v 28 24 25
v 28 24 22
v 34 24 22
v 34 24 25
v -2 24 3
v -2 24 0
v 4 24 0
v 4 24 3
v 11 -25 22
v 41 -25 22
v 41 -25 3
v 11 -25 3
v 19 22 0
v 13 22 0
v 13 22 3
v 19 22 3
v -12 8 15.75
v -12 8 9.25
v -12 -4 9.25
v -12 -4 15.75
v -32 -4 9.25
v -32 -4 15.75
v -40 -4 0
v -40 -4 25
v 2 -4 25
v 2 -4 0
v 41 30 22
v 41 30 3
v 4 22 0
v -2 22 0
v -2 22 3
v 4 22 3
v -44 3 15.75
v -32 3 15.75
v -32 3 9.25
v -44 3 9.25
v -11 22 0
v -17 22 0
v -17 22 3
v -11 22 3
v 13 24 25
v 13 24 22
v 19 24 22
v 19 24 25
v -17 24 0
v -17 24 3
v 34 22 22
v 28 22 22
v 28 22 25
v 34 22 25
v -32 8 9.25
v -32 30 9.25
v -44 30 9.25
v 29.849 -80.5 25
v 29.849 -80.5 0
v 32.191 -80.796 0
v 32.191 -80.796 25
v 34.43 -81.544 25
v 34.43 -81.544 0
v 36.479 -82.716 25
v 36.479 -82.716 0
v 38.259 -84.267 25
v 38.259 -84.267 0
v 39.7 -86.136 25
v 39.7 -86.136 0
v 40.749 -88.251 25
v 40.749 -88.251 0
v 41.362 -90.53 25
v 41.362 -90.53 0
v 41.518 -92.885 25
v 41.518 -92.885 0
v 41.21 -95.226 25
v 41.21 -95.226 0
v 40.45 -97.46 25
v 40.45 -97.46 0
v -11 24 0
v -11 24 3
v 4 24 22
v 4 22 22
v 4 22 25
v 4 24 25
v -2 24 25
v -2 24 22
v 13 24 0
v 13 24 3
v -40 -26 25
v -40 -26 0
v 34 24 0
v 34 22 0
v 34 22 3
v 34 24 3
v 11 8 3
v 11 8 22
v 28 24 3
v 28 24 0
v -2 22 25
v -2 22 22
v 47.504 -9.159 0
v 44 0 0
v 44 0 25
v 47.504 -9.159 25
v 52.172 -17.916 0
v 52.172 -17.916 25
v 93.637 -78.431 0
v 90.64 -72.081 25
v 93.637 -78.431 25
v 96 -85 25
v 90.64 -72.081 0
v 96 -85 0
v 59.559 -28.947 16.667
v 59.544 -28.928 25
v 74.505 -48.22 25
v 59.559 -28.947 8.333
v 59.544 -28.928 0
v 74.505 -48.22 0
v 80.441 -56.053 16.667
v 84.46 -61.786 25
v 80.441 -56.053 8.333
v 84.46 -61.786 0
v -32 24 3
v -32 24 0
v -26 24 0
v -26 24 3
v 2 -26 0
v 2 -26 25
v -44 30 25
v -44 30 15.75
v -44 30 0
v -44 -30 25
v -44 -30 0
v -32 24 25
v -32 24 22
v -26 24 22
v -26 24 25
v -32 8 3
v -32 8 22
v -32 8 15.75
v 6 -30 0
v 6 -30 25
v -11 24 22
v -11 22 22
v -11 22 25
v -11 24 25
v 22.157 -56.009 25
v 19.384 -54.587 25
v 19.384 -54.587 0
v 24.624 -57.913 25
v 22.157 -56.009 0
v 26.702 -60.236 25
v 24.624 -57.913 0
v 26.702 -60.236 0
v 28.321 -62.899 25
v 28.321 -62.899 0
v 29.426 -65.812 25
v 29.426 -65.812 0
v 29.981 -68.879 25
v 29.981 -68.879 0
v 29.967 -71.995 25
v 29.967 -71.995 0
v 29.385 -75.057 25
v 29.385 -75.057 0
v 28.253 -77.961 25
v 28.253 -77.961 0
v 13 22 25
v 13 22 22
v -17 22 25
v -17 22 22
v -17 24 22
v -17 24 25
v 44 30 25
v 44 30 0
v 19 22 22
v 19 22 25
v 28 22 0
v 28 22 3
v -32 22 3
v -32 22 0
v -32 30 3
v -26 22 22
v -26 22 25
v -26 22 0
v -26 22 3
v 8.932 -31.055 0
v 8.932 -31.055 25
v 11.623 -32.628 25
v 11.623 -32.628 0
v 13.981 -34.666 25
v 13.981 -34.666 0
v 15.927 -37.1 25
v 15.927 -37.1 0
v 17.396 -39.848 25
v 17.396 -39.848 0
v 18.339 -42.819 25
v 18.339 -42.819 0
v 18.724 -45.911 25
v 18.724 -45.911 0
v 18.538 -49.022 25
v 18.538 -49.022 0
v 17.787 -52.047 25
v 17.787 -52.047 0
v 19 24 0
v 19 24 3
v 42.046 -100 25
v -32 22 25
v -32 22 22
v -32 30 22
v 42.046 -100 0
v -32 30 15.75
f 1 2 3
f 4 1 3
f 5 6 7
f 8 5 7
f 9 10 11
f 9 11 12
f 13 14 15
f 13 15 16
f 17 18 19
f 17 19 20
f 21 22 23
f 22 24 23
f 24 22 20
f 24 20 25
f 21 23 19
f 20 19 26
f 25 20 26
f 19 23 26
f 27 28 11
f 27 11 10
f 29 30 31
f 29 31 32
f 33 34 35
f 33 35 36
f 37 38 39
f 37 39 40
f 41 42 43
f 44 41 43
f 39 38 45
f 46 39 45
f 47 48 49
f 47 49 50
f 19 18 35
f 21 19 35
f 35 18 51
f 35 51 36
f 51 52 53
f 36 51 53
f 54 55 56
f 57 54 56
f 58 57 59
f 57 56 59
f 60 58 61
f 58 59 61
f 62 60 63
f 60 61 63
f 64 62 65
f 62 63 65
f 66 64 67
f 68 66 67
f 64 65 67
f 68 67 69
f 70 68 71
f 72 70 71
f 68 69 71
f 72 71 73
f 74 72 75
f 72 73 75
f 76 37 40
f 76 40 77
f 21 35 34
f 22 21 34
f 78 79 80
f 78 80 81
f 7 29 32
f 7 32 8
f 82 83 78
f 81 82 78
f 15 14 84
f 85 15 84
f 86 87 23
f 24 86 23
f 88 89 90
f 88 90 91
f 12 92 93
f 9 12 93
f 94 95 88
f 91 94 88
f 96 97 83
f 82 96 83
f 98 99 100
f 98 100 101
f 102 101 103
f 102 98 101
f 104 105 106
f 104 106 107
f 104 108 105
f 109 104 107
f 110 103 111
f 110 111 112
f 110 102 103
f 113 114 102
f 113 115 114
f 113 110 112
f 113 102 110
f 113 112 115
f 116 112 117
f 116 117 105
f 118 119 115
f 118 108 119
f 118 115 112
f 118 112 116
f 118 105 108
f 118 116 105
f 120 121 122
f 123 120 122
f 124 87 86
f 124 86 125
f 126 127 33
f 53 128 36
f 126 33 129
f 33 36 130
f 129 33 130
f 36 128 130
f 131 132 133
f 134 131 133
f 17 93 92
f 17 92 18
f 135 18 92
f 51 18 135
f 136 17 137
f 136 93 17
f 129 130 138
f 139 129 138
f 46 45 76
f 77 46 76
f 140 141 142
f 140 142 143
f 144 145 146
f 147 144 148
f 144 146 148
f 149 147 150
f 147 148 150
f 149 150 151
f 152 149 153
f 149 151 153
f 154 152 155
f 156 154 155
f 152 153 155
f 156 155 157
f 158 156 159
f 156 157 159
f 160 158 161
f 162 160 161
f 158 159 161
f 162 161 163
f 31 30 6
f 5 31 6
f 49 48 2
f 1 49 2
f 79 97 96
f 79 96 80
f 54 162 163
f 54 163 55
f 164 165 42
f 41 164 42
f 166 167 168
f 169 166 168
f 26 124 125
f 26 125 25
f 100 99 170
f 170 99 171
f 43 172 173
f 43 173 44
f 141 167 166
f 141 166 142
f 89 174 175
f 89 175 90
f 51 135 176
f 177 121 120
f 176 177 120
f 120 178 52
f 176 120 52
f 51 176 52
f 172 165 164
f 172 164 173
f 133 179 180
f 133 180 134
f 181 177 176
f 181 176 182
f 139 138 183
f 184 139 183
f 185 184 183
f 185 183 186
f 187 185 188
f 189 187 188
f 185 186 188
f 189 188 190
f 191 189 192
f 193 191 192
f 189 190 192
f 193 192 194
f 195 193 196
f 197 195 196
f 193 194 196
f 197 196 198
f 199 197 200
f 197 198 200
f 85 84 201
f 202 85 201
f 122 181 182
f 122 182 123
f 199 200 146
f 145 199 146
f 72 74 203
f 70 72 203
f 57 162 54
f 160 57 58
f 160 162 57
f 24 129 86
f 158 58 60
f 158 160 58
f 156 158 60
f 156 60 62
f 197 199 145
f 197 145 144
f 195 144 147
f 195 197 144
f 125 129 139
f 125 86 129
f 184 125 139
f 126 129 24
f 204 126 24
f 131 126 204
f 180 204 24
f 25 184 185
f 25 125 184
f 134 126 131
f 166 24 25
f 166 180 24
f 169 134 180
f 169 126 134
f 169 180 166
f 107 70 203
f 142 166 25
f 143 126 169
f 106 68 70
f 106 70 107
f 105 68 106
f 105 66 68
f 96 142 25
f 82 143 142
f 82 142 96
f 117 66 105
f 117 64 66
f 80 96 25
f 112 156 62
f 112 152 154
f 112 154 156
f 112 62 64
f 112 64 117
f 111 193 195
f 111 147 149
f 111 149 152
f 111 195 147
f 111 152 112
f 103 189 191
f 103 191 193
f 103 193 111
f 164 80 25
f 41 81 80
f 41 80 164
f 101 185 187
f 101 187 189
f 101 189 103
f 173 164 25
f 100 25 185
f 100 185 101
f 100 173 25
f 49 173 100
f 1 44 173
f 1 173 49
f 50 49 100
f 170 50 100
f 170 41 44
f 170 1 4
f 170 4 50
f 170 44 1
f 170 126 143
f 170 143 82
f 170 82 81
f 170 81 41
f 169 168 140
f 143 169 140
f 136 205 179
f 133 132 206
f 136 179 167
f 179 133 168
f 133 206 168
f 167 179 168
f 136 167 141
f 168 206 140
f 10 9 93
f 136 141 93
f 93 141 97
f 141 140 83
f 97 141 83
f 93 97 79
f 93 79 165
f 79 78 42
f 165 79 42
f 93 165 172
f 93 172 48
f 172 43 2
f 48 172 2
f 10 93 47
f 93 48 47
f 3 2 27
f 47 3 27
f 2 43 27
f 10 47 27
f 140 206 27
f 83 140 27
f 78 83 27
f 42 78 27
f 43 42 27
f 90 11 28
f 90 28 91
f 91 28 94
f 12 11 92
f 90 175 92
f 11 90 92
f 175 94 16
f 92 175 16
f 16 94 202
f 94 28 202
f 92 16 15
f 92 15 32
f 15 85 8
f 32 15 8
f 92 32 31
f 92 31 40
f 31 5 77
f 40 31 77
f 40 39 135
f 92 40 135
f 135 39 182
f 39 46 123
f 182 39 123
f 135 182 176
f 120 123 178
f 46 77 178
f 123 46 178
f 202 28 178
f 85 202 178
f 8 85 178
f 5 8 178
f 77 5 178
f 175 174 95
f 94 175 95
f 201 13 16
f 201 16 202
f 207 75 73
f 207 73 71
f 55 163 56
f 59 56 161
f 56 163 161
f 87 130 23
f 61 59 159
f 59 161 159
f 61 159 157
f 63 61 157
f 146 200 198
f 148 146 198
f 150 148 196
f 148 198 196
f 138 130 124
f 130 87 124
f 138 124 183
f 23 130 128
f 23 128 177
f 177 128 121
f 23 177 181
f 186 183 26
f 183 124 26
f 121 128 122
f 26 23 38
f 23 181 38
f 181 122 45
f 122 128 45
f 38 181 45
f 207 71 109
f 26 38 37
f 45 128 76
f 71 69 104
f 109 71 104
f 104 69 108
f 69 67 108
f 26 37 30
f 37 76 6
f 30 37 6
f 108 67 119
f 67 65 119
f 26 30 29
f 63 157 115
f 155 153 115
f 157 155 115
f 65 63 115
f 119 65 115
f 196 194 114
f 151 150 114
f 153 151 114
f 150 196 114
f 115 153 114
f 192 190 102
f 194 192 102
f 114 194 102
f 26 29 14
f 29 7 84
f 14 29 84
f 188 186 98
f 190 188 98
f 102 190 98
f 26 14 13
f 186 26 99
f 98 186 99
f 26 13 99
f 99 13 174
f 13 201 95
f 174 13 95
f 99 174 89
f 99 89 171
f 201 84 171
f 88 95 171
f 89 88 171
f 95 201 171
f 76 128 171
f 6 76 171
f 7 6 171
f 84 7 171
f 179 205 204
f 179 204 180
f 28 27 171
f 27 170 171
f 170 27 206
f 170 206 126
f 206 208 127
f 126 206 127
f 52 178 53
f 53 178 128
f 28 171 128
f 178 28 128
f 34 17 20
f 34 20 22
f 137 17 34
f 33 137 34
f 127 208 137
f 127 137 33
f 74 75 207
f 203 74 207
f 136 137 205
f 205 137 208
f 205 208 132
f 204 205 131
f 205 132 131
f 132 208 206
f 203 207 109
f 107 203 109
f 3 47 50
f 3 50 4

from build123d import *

# Parameters (mm, degrees)
F0_W     = 42
F0_H     = 22
F0_W_2   = 6
F0_H_2   = 2
F1_DEPTH = 25
F2_W     = 30
F2_H     = 19
F2_W_2   = 20
F2_H_2   = 6.5
F2_W_3   = 12
F3_DEPTH = 22
F4_DEPTH = 55
F5_DEPTH = 34
F6_DEPTH = 27


with BuildPart() as f1:
    # F0 (on Top) → F1 (new body)
    with BuildSketch(Plane.XY):
        Polygon((44, 30), (-44, 30), (-44, -30), (6, -30), (44, -30), (44, 0), align=None)
        with Locations((-19, -15)):
            Rectangle(F0_W, F0_H, mode=Mode.SUBTRACT)
        with Locations((-29, 23)):
            Rectangle(F0_W_2, F0_H_2, mode=Mode.SUBTRACT)
        with Locations((-14, 23)):
            Rectangle(F0_W_2, F0_H_2, mode=Mode.SUBTRACT)
        with Locations((1, 23)):
            Rectangle(F0_W_2, F0_H_2, mode=Mode.SUBTRACT)
        with Locations((16, 23)):
            Rectangle(F0_W_2, F0_H_2, mode=Mode.SUBTRACT)
        with Locations((31, 23)):
            Rectangle(F0_W_2, F0_H_2, mode=Mode.SUBTRACT)
        with BuildLine():
            add(Edge.make_bspline(
                [(44, 0), (53.346686, -31.095194), (86.653314, -53.904806), (96, -85)],
                knots=[0, 0, 0, 0, 99.644368, 99.644368, 99.644368, 99.644368], degree=3))
            Line((44, 0), (44, -30))
            Line((44, -30), (6, -30))
            ThreePointArc((6, -30), (16.724801, -38.440392), (17.787344, -52.046735))
            Line((17.787344, -52.046735), (19.384056, -54.586521))
            ThreePointArc((19.384056, -54.586521), (28.940376, -64.33015), (28.252722, -77.960582))
            Line((28.252722, -77.960582), (29.849434, -80.500368))
            ThreePointArc((29.849434, -80.500368), (39.700482, -86.135868), (40.449604, -97.460214))
            Line((40.449604, -97.460214), (42.046316, -100))
            Line((42.046316, -100), (96, -85))
        make_face()
    extrude(amount=F1_DEPTH)

    # F2 (on face) → F3 (cut)
    with BuildSketch(Plane(origin=(0, 30, 0), x_dir=(-1, 0, 0), z_dir=(0, 1, 0))):
        with Locations((-26, 12.5)):
            Rectangle(F2_W, F2_H)
        Polygon((32, 22), (-11, 22), (-11, 3), (32, 3), (32, 9.25), (12, 9.25), (12, 15.75), (32, 15.75), align=None)
        with Locations((22, 12.5)):
            Rectangle(F2_W_2, F2_H_2)
        with Locations((38, 12.5)):
            Rectangle(F2_W_3, F2_H_2)
    extrude(amount=-F3_DEPTH, mode=Mode.SUBTRACT)

    # F2 (on face) → F4 (cut)
    with BuildSketch(Plane(origin=(0, 30, 0), x_dir=(-1, 0, 0), z_dir=(0, 1, 0))):
        with Locations((-26, 12.5)):
            Rectangle(F2_W, F2_H)
    extrude(amount=-F4_DEPTH, mode=Mode.SUBTRACT)

    # F2 (on face) → F5 (cut, through all)
    with BuildSketch(Plane(origin=(0, 30, 0), x_dir=(-1, 0, 0), z_dir=(0, 1, 0))):
        with Locations((22, 12.5)):
            Rectangle(F2_W_2, F2_H_2)
    extrude(amount=-F5_DEPTH, mode=Mode.SUBTRACT)

    # F2 (on face) → F6 (cut)
    with BuildSketch(Plane(origin=(0, 30, 0), x_dir=(-1, 0, 0), z_dir=(0, 1, 0))):
        with Locations((38, 12.5)):
            Rectangle(F2_W_3, F2_H_2)
    extrude(amount=-F6_DEPTH, mode=Mode.SUBTRACT)


solid = f1.part
